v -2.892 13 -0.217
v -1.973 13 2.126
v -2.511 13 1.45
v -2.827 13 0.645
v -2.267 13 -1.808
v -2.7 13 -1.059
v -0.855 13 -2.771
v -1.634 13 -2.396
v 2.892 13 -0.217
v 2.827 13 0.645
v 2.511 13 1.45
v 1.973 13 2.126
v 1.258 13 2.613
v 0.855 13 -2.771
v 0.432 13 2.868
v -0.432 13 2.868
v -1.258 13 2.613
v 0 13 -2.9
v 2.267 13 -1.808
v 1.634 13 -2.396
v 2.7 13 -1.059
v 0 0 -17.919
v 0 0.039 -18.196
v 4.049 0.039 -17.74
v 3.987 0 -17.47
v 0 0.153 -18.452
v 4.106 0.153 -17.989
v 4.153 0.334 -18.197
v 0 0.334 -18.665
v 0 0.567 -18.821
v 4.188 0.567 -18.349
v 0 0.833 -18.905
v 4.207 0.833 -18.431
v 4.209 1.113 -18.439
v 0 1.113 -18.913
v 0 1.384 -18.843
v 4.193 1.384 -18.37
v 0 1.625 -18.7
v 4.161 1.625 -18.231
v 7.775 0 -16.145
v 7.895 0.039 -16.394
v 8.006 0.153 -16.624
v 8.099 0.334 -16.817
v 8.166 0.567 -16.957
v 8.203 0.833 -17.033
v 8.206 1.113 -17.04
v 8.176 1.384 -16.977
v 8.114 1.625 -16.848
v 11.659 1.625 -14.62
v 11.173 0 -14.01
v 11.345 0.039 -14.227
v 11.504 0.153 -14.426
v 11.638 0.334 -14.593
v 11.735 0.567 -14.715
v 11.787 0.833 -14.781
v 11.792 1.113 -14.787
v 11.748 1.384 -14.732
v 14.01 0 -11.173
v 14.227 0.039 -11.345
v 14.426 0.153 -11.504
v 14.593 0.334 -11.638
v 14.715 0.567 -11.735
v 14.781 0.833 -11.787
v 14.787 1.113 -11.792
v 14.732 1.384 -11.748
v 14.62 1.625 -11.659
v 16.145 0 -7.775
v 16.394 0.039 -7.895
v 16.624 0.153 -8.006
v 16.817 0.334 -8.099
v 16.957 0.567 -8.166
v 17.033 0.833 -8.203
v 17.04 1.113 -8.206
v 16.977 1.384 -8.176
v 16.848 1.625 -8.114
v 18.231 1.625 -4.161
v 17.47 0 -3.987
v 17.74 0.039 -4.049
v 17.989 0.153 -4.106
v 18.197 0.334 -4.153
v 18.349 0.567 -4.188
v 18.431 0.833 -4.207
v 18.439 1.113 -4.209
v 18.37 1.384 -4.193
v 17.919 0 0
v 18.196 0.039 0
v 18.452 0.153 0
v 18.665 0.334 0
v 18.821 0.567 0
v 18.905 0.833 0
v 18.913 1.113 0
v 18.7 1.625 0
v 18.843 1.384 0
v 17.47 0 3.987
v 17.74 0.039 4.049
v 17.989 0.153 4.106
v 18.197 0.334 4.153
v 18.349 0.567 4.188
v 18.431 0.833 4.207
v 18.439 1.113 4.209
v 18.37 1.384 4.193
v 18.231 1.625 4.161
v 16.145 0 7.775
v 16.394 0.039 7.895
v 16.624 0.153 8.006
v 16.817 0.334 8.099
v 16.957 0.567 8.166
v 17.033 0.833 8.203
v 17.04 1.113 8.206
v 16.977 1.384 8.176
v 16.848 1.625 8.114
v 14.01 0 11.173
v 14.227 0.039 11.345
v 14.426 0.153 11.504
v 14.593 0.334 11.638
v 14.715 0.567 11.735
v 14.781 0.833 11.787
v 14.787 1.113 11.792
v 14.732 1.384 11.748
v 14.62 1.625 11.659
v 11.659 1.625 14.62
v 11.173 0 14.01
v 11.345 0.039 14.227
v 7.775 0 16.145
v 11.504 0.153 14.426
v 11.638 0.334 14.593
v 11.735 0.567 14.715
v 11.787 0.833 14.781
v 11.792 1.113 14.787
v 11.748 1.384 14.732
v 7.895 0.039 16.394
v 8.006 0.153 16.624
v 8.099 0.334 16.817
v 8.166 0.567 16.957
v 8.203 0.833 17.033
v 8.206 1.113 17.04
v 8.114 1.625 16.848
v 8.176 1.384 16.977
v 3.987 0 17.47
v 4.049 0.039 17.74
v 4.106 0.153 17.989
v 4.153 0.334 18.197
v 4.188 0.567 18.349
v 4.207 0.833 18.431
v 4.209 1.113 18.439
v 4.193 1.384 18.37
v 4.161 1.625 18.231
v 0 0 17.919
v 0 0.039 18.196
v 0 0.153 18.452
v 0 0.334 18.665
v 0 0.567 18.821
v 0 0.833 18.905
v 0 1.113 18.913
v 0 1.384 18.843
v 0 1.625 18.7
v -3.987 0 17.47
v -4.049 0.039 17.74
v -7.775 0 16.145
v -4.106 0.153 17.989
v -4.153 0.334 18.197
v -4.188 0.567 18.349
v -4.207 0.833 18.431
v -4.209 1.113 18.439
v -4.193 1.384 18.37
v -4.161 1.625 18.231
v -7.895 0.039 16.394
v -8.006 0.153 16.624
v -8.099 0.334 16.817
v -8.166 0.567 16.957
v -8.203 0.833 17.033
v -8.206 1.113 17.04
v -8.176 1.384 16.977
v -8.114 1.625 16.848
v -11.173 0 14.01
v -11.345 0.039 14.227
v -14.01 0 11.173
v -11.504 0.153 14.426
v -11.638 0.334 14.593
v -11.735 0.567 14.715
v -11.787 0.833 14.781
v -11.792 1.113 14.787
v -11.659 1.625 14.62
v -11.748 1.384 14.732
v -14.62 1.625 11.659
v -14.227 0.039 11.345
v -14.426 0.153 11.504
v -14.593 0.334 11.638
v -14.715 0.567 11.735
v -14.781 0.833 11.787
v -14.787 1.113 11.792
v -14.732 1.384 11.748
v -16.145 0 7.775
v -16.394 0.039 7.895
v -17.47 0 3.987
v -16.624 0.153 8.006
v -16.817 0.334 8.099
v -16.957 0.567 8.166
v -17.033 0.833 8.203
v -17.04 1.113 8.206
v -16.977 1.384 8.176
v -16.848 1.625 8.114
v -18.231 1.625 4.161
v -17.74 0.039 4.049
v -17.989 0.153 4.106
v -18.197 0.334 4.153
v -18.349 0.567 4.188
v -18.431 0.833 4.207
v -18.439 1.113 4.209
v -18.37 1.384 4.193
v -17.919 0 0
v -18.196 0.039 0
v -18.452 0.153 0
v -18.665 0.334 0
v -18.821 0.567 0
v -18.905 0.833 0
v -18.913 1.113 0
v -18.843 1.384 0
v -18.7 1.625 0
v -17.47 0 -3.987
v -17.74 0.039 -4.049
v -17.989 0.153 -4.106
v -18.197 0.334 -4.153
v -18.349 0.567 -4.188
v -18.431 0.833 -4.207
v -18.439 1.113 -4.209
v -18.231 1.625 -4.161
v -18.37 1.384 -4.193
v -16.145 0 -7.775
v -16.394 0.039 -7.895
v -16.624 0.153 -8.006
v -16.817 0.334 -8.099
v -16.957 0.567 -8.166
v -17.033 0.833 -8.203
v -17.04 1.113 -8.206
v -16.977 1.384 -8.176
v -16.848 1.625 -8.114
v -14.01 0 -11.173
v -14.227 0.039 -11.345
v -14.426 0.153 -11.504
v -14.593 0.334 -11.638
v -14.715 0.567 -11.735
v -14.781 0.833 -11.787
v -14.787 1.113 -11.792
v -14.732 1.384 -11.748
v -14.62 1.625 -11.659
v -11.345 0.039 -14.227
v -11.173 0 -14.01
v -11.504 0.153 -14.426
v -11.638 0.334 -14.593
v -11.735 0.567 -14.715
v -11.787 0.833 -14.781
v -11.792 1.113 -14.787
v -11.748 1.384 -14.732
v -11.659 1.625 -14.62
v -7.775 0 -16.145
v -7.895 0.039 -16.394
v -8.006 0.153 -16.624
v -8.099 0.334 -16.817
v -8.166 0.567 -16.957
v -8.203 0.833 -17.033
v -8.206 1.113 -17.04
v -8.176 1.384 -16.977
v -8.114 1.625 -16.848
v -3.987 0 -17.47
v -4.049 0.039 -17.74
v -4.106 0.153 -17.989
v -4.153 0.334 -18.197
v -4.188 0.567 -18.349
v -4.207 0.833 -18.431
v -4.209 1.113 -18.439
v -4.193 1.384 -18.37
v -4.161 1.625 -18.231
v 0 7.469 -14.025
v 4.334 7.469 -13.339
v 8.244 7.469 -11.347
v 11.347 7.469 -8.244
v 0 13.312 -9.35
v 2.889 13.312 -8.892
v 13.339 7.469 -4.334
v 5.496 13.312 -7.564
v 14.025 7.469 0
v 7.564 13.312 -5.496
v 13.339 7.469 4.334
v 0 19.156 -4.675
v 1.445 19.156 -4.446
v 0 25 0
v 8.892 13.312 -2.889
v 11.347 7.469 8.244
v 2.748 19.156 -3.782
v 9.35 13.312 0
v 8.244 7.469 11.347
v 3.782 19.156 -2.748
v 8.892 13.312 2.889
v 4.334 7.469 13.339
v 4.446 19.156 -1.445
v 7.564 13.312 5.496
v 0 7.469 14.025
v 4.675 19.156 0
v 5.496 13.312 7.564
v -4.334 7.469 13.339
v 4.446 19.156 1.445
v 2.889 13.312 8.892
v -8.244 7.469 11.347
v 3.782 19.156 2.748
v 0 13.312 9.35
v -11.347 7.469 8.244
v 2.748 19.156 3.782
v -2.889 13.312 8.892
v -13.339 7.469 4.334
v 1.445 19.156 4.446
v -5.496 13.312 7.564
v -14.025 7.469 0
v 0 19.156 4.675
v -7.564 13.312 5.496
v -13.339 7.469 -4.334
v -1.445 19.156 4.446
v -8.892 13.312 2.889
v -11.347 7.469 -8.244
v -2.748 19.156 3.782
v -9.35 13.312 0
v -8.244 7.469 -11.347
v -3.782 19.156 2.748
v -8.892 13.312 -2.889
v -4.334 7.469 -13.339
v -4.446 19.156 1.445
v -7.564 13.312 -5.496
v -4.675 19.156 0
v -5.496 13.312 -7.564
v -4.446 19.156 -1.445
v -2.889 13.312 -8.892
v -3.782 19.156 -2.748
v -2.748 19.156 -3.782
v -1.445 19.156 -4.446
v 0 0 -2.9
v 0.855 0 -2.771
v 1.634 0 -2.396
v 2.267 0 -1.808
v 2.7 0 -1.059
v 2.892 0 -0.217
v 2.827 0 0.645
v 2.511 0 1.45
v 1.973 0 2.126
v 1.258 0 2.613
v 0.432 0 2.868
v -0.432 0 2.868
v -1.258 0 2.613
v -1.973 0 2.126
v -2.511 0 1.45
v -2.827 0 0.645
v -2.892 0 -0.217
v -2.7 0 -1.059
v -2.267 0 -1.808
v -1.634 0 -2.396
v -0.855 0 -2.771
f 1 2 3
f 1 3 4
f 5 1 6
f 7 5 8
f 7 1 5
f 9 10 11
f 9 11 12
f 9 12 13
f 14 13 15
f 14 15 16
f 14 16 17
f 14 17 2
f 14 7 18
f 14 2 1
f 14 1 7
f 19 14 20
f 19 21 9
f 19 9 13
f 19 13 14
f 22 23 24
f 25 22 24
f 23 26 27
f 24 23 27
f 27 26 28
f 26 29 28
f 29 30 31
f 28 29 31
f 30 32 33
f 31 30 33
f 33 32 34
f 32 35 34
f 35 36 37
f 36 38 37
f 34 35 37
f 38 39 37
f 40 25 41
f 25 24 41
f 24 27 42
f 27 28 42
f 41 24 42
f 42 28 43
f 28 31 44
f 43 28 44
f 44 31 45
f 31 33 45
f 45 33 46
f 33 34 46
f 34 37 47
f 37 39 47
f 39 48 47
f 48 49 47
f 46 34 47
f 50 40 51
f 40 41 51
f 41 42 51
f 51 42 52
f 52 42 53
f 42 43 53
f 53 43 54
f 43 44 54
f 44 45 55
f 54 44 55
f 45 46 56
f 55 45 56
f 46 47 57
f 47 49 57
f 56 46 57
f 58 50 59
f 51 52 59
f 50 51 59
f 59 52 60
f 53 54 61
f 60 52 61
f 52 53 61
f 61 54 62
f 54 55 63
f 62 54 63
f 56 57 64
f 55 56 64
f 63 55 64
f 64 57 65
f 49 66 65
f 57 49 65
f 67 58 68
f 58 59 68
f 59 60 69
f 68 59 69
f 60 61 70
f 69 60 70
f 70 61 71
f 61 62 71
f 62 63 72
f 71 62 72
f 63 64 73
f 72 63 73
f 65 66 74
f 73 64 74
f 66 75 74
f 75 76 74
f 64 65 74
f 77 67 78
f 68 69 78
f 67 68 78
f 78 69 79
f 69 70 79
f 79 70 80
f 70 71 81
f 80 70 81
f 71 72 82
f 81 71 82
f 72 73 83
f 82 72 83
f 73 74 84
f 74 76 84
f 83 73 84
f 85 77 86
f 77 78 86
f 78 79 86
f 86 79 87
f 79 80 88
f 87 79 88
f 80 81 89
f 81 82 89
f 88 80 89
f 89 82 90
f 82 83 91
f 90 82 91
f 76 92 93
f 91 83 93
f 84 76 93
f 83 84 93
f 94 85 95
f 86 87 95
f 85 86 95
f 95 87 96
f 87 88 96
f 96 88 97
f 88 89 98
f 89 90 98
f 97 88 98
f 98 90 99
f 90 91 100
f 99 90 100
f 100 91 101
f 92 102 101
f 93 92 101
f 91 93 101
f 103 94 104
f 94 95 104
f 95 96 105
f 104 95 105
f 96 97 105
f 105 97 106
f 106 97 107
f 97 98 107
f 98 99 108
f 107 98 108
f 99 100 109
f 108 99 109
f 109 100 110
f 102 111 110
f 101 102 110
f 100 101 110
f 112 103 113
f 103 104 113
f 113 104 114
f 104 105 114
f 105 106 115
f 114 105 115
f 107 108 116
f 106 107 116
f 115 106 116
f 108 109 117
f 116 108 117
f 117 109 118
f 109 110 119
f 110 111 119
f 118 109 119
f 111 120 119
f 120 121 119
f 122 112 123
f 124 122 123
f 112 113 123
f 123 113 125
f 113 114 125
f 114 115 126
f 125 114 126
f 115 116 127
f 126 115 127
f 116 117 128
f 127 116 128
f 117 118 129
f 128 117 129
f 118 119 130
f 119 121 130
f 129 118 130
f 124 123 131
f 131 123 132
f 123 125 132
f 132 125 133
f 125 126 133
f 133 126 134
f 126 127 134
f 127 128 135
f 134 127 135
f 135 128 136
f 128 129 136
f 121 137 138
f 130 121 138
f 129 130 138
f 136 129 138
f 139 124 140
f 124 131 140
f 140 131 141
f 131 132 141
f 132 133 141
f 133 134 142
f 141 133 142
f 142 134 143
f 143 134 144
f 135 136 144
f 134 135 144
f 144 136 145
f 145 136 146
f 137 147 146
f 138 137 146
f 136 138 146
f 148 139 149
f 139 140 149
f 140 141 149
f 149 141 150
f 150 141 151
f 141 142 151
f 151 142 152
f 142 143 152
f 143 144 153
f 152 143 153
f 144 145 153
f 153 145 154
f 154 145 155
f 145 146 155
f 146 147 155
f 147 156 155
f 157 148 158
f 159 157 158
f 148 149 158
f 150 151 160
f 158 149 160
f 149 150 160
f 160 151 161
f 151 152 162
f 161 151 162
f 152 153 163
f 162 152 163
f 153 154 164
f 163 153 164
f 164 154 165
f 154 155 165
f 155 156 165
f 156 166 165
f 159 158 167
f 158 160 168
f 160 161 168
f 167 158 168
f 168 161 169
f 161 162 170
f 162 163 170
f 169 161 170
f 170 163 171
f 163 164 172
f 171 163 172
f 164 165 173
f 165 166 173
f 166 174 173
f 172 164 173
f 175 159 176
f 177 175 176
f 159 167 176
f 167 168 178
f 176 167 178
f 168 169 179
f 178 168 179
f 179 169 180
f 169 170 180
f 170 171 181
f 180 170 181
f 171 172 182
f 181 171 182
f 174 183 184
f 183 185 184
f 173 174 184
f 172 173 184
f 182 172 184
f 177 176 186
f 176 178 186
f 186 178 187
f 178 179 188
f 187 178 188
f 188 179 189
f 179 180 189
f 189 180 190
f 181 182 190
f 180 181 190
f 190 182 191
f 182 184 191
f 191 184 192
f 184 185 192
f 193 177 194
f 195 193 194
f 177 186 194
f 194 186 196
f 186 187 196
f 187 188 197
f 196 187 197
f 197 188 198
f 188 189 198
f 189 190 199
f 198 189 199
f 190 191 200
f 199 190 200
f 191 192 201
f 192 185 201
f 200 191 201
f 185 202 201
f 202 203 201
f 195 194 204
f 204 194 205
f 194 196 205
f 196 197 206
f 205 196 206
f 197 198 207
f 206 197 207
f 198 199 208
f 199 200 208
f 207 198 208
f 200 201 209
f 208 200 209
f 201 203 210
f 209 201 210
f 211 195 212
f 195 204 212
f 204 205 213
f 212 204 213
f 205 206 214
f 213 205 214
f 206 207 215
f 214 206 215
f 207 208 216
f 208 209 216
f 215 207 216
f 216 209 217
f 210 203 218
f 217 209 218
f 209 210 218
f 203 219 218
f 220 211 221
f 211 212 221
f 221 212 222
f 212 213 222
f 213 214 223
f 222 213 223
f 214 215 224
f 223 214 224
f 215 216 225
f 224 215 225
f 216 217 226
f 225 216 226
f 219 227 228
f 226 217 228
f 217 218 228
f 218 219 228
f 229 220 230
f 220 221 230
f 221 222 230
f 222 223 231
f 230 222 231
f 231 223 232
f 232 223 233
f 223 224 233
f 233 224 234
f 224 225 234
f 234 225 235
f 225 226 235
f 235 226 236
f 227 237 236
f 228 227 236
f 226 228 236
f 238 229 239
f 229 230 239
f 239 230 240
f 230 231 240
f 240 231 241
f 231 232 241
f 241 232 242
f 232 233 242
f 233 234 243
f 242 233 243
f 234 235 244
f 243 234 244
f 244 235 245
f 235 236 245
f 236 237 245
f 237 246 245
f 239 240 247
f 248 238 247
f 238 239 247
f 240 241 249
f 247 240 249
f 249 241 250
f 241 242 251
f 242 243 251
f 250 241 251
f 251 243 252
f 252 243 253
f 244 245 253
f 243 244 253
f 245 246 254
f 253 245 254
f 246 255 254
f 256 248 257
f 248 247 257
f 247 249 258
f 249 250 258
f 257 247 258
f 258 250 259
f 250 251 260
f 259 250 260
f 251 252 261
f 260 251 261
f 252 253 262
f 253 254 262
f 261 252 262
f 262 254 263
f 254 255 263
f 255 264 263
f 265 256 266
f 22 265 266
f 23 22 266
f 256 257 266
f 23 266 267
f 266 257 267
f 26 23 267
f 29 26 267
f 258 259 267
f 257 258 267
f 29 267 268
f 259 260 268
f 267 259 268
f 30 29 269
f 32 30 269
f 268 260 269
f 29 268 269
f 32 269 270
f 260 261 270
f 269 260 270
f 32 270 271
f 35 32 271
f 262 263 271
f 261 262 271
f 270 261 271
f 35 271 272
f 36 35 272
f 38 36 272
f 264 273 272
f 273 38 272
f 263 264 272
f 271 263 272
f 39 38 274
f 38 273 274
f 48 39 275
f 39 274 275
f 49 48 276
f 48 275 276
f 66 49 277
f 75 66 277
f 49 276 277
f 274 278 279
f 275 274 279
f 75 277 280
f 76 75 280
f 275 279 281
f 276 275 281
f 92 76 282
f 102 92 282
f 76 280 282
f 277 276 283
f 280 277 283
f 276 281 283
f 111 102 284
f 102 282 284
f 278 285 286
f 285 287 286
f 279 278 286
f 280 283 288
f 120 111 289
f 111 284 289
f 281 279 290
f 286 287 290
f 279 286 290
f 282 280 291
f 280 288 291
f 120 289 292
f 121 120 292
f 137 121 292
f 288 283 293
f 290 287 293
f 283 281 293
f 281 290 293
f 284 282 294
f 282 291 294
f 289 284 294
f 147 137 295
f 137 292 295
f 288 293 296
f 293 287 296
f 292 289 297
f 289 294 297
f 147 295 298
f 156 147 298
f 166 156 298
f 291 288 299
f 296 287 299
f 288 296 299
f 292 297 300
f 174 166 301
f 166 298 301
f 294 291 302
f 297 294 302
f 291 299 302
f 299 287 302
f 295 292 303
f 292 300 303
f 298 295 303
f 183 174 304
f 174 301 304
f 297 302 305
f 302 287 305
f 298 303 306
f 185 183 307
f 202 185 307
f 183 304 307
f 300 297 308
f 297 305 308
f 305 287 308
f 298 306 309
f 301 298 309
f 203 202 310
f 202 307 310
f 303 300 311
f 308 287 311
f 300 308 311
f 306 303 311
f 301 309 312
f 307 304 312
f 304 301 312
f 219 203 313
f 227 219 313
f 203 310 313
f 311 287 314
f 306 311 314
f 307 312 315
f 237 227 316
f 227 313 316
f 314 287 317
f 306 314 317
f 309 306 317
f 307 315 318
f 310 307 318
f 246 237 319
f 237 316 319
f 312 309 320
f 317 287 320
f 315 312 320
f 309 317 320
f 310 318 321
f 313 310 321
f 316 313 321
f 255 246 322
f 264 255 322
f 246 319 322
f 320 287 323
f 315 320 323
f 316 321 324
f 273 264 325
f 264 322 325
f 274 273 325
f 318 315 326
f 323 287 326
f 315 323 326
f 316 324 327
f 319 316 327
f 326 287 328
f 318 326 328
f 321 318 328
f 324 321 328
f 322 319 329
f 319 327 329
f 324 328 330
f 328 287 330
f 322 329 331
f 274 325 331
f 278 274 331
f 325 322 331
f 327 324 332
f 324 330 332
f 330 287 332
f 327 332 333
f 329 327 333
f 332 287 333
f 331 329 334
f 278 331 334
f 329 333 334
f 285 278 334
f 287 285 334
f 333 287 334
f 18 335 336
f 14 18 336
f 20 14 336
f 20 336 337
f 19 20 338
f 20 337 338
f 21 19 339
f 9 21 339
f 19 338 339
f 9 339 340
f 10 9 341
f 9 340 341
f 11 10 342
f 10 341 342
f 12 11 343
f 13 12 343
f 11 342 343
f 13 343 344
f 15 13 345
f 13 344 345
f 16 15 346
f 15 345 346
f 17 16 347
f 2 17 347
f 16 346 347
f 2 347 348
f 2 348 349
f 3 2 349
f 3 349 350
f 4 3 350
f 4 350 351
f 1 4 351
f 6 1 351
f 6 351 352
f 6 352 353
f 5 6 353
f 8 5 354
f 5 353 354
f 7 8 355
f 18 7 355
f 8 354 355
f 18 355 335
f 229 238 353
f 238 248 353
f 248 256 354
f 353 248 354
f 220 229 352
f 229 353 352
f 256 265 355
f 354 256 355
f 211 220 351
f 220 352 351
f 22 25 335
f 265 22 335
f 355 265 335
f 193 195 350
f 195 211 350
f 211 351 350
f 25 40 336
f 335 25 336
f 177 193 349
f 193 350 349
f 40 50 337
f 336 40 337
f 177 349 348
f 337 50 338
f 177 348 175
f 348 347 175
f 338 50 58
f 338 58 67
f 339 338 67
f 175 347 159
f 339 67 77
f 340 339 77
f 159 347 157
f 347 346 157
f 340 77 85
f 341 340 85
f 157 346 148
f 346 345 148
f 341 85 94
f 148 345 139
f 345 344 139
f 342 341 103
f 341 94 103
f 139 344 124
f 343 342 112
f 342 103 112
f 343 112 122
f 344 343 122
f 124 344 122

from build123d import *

# Parameters (mm, degrees)
SKETCH2_R          = 2.9
CUT_EXTRUDE1_DEPTH = 13
FILLET1_R          = 1


with BuildPart() as part:
    # Sketch1 → Revolve1 (revolve)
    with BuildSketch(Plane.XY, mode=Mode.PRIVATE) as revolve1_sk:
        Polygon((0, 0), (20, 0), (0, 25), align=None)
    revolve(revolve1_sk.sketch.rotate(Axis((0, 25, 0), (0, -1, 0)), 270), axis=Axis((0, 25, 0), (0, -1, 0)))

    # Sketch2 → Cut-Extrude1 (cut)
    with BuildSketch(Plane.XZ):
        with Locations(Location((0, 0, 0), (0, 0, 270))):
            Circle(SKETCH2_R)
    extrude(amount=-CUT_EXTRUDE1_DEPTH, mode=Mode.SUBTRACT)

    # Fillet1
    fillet1_edges = [part.edges().sort_by_distance(p)[0] for p in [
        (0, 0, 20),
    ]]
    fillet(fillet1_edges, radius=FILLET1_R)


solid = part.part
